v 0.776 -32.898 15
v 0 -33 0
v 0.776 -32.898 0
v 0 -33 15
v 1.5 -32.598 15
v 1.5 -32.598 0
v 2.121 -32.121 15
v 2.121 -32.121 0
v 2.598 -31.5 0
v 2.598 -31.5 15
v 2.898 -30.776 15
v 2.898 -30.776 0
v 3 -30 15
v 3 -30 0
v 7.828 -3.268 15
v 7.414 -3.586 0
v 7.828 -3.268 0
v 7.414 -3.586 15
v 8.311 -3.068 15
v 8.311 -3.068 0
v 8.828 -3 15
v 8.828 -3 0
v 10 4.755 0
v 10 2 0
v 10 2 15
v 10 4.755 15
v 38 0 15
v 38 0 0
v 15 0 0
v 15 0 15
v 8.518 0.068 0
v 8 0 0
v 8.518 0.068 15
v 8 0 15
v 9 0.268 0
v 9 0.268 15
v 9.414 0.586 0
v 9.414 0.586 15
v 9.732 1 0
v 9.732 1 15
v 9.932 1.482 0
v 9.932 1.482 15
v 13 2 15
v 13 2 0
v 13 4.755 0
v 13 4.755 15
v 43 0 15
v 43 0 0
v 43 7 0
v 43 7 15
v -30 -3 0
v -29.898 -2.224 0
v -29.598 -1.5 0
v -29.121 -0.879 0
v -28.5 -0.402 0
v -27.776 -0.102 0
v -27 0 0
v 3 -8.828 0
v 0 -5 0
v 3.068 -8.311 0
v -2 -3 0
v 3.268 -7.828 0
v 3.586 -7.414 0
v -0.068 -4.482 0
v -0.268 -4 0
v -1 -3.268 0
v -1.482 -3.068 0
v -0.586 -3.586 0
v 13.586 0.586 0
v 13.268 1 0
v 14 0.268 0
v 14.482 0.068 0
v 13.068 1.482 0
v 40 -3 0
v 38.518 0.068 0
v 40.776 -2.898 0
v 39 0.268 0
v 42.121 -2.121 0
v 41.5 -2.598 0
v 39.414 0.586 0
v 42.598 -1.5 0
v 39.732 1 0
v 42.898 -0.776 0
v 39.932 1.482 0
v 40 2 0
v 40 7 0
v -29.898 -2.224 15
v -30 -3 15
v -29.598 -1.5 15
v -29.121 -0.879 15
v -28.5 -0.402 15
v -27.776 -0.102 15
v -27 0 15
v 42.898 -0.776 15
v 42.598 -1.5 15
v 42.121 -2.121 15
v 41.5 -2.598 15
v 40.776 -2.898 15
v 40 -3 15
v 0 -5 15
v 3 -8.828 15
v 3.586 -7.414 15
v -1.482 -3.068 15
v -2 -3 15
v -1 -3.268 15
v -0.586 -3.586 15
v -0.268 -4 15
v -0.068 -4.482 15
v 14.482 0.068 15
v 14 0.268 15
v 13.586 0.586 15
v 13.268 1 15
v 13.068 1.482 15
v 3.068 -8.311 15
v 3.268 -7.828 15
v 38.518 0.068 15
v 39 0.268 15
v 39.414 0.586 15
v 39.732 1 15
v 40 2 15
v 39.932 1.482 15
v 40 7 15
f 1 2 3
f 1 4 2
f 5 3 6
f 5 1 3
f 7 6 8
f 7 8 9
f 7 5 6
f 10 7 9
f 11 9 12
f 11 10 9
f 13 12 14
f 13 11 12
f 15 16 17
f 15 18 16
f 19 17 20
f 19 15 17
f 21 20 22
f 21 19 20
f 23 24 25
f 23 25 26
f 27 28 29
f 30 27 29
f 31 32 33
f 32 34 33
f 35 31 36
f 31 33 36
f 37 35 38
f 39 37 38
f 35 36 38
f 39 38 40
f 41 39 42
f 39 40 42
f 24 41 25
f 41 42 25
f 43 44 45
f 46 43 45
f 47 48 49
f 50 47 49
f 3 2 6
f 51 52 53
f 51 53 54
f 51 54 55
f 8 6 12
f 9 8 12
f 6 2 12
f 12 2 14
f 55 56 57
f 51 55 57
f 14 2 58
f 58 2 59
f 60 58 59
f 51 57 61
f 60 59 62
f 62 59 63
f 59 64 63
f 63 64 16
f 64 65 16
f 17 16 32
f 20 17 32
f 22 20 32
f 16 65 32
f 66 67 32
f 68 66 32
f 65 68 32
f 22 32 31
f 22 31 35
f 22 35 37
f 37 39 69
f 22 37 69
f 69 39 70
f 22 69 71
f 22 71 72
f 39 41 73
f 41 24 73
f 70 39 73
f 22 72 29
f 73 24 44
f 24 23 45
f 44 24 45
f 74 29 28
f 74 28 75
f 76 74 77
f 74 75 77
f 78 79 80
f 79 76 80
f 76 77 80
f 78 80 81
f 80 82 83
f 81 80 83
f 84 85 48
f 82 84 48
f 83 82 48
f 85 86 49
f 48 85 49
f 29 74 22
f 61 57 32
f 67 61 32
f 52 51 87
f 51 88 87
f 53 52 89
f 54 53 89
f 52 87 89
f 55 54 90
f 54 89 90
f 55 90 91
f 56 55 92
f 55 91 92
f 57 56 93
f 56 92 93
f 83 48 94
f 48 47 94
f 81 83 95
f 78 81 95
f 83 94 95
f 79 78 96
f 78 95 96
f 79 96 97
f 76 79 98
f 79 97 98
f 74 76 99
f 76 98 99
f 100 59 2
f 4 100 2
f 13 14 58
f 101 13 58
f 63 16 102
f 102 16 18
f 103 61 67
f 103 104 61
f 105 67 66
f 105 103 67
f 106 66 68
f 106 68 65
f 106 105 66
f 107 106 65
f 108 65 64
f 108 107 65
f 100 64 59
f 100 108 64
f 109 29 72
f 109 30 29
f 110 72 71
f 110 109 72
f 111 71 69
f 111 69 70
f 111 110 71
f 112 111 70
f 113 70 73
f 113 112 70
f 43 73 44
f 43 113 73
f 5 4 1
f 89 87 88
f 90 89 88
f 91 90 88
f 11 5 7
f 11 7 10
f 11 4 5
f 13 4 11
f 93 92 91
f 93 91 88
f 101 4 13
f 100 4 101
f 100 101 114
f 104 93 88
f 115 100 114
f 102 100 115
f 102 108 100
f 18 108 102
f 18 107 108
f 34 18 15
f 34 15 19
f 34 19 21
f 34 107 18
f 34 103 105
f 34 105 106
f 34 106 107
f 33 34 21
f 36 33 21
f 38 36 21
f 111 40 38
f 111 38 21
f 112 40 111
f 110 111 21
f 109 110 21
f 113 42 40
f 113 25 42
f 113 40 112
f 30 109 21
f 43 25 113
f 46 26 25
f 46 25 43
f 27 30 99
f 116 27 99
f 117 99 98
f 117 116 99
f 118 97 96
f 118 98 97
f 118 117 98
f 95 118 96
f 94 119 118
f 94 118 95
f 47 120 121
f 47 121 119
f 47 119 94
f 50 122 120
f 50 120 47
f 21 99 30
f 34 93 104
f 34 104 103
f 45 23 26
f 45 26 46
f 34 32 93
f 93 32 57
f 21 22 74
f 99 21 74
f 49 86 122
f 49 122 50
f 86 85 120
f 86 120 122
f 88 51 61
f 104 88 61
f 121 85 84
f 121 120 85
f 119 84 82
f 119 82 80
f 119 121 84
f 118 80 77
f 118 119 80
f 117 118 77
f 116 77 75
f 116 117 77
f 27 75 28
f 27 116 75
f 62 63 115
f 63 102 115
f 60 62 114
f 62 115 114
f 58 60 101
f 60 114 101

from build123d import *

# Parameters (mm, degrees)
F0_W     = 30
F0_H     = 3
F0_W_2   = 3
F0_H_2   = 4.7552157193
F0_H_3   = 7
F1_DEPTH = 15
F2_R     = 2
F3_SIZE  = 5
F4_R     = 2
F5_R     = 3
F6_R     = 2.99999
F7_R     = 2.99999
F8_R     = 2
F9_R     = 2


# Not quite as in the source:
# - a fillet or chamfer is up to 0.001 mm smaller than in the source, because OpenCascade refuses the exact size


with BuildPart() as f1:
    # F0 (on Top) → F1 (new body)
    with BuildSketch(Plane.XY):
        with Locations((-15, -1.5)):
            Rectangle(F0_W, F0_H)
        Polygon((3, 0), (0, 0), (0, -3), (0, -33), (3, -33), (3, -3), align=None)
        Polygon((10, 0), (3, 0), (3, -3), (43, -3), (43, 0), (40, 0), (13, 0), align=None)
        with Locations((11.5, 2.3776078597)):
            Rectangle(F0_W_2, F0_H_2)
        with Locations((41.5, 3.5)):
            Rectangle(F0_W_2, F0_H_3)
    extrude(amount=F1_DEPTH)

    # F2
    f2_edges = [f1.edges().sort_by_distance(p)[0] for p in [
        (0, -3, 7.5),
    ]]
    fillet(f2_edges, radius=F2_R)

    # F3
    f3_edges = [f1.edges().sort_by_distance(p)[0] for p in [
        (3, -3, 7.5),
    ]]
    chamfer(f3_edges, length=F3_SIZE)

    # F4
    f4_edges = [f1.edges().sort_by_distance(p)[0] for p in [
        (13, 0, 7.5),
        (40, 0, 7.5),
        (10, 0, 7.5),
    ]]
    fillet(f4_edges, radius=F4_R)

    # F5
    f5_edges = [f1.edges().sort_by_distance(p)[0] for p in [
        (43, -3, 7.5),
    ]]
    fillet(f5_edges, radius=F5_R)

    # F6 (radius 3 in the source; OpenCascade refuses exactly that, so slightly less here)
    f6_edges = [f1.edges().sort_by_distance(p)[0] for p in [
        (-30, 0, 7.5),
    ]]
    fillet(f6_edges, radius=F6_R)

    # F7 (radius 3 in the source; OpenCascade refuses exactly that, so slightly less here)
    f7_edges = [f1.edges().sort_by_distance(p)[0] for p in [
        (3, -33, 7.5),
    ]]
    fillet(f7_edges, radius=F7_R)

    # F8
    f8_edges = [f1.edges().sort_by_distance(p)[0] for p in [
        (8, -3, 7.5),
    ]]
    fillet(f8_edges, radius=F8_R)

    # F9
    f9_edges = [f1.edges().sort_by_distance(p)[0] for p in [
        (3, -8, 7.5),
    ]]
    fillet(f9_edges, radius=F9_R)


solid = f1.part
